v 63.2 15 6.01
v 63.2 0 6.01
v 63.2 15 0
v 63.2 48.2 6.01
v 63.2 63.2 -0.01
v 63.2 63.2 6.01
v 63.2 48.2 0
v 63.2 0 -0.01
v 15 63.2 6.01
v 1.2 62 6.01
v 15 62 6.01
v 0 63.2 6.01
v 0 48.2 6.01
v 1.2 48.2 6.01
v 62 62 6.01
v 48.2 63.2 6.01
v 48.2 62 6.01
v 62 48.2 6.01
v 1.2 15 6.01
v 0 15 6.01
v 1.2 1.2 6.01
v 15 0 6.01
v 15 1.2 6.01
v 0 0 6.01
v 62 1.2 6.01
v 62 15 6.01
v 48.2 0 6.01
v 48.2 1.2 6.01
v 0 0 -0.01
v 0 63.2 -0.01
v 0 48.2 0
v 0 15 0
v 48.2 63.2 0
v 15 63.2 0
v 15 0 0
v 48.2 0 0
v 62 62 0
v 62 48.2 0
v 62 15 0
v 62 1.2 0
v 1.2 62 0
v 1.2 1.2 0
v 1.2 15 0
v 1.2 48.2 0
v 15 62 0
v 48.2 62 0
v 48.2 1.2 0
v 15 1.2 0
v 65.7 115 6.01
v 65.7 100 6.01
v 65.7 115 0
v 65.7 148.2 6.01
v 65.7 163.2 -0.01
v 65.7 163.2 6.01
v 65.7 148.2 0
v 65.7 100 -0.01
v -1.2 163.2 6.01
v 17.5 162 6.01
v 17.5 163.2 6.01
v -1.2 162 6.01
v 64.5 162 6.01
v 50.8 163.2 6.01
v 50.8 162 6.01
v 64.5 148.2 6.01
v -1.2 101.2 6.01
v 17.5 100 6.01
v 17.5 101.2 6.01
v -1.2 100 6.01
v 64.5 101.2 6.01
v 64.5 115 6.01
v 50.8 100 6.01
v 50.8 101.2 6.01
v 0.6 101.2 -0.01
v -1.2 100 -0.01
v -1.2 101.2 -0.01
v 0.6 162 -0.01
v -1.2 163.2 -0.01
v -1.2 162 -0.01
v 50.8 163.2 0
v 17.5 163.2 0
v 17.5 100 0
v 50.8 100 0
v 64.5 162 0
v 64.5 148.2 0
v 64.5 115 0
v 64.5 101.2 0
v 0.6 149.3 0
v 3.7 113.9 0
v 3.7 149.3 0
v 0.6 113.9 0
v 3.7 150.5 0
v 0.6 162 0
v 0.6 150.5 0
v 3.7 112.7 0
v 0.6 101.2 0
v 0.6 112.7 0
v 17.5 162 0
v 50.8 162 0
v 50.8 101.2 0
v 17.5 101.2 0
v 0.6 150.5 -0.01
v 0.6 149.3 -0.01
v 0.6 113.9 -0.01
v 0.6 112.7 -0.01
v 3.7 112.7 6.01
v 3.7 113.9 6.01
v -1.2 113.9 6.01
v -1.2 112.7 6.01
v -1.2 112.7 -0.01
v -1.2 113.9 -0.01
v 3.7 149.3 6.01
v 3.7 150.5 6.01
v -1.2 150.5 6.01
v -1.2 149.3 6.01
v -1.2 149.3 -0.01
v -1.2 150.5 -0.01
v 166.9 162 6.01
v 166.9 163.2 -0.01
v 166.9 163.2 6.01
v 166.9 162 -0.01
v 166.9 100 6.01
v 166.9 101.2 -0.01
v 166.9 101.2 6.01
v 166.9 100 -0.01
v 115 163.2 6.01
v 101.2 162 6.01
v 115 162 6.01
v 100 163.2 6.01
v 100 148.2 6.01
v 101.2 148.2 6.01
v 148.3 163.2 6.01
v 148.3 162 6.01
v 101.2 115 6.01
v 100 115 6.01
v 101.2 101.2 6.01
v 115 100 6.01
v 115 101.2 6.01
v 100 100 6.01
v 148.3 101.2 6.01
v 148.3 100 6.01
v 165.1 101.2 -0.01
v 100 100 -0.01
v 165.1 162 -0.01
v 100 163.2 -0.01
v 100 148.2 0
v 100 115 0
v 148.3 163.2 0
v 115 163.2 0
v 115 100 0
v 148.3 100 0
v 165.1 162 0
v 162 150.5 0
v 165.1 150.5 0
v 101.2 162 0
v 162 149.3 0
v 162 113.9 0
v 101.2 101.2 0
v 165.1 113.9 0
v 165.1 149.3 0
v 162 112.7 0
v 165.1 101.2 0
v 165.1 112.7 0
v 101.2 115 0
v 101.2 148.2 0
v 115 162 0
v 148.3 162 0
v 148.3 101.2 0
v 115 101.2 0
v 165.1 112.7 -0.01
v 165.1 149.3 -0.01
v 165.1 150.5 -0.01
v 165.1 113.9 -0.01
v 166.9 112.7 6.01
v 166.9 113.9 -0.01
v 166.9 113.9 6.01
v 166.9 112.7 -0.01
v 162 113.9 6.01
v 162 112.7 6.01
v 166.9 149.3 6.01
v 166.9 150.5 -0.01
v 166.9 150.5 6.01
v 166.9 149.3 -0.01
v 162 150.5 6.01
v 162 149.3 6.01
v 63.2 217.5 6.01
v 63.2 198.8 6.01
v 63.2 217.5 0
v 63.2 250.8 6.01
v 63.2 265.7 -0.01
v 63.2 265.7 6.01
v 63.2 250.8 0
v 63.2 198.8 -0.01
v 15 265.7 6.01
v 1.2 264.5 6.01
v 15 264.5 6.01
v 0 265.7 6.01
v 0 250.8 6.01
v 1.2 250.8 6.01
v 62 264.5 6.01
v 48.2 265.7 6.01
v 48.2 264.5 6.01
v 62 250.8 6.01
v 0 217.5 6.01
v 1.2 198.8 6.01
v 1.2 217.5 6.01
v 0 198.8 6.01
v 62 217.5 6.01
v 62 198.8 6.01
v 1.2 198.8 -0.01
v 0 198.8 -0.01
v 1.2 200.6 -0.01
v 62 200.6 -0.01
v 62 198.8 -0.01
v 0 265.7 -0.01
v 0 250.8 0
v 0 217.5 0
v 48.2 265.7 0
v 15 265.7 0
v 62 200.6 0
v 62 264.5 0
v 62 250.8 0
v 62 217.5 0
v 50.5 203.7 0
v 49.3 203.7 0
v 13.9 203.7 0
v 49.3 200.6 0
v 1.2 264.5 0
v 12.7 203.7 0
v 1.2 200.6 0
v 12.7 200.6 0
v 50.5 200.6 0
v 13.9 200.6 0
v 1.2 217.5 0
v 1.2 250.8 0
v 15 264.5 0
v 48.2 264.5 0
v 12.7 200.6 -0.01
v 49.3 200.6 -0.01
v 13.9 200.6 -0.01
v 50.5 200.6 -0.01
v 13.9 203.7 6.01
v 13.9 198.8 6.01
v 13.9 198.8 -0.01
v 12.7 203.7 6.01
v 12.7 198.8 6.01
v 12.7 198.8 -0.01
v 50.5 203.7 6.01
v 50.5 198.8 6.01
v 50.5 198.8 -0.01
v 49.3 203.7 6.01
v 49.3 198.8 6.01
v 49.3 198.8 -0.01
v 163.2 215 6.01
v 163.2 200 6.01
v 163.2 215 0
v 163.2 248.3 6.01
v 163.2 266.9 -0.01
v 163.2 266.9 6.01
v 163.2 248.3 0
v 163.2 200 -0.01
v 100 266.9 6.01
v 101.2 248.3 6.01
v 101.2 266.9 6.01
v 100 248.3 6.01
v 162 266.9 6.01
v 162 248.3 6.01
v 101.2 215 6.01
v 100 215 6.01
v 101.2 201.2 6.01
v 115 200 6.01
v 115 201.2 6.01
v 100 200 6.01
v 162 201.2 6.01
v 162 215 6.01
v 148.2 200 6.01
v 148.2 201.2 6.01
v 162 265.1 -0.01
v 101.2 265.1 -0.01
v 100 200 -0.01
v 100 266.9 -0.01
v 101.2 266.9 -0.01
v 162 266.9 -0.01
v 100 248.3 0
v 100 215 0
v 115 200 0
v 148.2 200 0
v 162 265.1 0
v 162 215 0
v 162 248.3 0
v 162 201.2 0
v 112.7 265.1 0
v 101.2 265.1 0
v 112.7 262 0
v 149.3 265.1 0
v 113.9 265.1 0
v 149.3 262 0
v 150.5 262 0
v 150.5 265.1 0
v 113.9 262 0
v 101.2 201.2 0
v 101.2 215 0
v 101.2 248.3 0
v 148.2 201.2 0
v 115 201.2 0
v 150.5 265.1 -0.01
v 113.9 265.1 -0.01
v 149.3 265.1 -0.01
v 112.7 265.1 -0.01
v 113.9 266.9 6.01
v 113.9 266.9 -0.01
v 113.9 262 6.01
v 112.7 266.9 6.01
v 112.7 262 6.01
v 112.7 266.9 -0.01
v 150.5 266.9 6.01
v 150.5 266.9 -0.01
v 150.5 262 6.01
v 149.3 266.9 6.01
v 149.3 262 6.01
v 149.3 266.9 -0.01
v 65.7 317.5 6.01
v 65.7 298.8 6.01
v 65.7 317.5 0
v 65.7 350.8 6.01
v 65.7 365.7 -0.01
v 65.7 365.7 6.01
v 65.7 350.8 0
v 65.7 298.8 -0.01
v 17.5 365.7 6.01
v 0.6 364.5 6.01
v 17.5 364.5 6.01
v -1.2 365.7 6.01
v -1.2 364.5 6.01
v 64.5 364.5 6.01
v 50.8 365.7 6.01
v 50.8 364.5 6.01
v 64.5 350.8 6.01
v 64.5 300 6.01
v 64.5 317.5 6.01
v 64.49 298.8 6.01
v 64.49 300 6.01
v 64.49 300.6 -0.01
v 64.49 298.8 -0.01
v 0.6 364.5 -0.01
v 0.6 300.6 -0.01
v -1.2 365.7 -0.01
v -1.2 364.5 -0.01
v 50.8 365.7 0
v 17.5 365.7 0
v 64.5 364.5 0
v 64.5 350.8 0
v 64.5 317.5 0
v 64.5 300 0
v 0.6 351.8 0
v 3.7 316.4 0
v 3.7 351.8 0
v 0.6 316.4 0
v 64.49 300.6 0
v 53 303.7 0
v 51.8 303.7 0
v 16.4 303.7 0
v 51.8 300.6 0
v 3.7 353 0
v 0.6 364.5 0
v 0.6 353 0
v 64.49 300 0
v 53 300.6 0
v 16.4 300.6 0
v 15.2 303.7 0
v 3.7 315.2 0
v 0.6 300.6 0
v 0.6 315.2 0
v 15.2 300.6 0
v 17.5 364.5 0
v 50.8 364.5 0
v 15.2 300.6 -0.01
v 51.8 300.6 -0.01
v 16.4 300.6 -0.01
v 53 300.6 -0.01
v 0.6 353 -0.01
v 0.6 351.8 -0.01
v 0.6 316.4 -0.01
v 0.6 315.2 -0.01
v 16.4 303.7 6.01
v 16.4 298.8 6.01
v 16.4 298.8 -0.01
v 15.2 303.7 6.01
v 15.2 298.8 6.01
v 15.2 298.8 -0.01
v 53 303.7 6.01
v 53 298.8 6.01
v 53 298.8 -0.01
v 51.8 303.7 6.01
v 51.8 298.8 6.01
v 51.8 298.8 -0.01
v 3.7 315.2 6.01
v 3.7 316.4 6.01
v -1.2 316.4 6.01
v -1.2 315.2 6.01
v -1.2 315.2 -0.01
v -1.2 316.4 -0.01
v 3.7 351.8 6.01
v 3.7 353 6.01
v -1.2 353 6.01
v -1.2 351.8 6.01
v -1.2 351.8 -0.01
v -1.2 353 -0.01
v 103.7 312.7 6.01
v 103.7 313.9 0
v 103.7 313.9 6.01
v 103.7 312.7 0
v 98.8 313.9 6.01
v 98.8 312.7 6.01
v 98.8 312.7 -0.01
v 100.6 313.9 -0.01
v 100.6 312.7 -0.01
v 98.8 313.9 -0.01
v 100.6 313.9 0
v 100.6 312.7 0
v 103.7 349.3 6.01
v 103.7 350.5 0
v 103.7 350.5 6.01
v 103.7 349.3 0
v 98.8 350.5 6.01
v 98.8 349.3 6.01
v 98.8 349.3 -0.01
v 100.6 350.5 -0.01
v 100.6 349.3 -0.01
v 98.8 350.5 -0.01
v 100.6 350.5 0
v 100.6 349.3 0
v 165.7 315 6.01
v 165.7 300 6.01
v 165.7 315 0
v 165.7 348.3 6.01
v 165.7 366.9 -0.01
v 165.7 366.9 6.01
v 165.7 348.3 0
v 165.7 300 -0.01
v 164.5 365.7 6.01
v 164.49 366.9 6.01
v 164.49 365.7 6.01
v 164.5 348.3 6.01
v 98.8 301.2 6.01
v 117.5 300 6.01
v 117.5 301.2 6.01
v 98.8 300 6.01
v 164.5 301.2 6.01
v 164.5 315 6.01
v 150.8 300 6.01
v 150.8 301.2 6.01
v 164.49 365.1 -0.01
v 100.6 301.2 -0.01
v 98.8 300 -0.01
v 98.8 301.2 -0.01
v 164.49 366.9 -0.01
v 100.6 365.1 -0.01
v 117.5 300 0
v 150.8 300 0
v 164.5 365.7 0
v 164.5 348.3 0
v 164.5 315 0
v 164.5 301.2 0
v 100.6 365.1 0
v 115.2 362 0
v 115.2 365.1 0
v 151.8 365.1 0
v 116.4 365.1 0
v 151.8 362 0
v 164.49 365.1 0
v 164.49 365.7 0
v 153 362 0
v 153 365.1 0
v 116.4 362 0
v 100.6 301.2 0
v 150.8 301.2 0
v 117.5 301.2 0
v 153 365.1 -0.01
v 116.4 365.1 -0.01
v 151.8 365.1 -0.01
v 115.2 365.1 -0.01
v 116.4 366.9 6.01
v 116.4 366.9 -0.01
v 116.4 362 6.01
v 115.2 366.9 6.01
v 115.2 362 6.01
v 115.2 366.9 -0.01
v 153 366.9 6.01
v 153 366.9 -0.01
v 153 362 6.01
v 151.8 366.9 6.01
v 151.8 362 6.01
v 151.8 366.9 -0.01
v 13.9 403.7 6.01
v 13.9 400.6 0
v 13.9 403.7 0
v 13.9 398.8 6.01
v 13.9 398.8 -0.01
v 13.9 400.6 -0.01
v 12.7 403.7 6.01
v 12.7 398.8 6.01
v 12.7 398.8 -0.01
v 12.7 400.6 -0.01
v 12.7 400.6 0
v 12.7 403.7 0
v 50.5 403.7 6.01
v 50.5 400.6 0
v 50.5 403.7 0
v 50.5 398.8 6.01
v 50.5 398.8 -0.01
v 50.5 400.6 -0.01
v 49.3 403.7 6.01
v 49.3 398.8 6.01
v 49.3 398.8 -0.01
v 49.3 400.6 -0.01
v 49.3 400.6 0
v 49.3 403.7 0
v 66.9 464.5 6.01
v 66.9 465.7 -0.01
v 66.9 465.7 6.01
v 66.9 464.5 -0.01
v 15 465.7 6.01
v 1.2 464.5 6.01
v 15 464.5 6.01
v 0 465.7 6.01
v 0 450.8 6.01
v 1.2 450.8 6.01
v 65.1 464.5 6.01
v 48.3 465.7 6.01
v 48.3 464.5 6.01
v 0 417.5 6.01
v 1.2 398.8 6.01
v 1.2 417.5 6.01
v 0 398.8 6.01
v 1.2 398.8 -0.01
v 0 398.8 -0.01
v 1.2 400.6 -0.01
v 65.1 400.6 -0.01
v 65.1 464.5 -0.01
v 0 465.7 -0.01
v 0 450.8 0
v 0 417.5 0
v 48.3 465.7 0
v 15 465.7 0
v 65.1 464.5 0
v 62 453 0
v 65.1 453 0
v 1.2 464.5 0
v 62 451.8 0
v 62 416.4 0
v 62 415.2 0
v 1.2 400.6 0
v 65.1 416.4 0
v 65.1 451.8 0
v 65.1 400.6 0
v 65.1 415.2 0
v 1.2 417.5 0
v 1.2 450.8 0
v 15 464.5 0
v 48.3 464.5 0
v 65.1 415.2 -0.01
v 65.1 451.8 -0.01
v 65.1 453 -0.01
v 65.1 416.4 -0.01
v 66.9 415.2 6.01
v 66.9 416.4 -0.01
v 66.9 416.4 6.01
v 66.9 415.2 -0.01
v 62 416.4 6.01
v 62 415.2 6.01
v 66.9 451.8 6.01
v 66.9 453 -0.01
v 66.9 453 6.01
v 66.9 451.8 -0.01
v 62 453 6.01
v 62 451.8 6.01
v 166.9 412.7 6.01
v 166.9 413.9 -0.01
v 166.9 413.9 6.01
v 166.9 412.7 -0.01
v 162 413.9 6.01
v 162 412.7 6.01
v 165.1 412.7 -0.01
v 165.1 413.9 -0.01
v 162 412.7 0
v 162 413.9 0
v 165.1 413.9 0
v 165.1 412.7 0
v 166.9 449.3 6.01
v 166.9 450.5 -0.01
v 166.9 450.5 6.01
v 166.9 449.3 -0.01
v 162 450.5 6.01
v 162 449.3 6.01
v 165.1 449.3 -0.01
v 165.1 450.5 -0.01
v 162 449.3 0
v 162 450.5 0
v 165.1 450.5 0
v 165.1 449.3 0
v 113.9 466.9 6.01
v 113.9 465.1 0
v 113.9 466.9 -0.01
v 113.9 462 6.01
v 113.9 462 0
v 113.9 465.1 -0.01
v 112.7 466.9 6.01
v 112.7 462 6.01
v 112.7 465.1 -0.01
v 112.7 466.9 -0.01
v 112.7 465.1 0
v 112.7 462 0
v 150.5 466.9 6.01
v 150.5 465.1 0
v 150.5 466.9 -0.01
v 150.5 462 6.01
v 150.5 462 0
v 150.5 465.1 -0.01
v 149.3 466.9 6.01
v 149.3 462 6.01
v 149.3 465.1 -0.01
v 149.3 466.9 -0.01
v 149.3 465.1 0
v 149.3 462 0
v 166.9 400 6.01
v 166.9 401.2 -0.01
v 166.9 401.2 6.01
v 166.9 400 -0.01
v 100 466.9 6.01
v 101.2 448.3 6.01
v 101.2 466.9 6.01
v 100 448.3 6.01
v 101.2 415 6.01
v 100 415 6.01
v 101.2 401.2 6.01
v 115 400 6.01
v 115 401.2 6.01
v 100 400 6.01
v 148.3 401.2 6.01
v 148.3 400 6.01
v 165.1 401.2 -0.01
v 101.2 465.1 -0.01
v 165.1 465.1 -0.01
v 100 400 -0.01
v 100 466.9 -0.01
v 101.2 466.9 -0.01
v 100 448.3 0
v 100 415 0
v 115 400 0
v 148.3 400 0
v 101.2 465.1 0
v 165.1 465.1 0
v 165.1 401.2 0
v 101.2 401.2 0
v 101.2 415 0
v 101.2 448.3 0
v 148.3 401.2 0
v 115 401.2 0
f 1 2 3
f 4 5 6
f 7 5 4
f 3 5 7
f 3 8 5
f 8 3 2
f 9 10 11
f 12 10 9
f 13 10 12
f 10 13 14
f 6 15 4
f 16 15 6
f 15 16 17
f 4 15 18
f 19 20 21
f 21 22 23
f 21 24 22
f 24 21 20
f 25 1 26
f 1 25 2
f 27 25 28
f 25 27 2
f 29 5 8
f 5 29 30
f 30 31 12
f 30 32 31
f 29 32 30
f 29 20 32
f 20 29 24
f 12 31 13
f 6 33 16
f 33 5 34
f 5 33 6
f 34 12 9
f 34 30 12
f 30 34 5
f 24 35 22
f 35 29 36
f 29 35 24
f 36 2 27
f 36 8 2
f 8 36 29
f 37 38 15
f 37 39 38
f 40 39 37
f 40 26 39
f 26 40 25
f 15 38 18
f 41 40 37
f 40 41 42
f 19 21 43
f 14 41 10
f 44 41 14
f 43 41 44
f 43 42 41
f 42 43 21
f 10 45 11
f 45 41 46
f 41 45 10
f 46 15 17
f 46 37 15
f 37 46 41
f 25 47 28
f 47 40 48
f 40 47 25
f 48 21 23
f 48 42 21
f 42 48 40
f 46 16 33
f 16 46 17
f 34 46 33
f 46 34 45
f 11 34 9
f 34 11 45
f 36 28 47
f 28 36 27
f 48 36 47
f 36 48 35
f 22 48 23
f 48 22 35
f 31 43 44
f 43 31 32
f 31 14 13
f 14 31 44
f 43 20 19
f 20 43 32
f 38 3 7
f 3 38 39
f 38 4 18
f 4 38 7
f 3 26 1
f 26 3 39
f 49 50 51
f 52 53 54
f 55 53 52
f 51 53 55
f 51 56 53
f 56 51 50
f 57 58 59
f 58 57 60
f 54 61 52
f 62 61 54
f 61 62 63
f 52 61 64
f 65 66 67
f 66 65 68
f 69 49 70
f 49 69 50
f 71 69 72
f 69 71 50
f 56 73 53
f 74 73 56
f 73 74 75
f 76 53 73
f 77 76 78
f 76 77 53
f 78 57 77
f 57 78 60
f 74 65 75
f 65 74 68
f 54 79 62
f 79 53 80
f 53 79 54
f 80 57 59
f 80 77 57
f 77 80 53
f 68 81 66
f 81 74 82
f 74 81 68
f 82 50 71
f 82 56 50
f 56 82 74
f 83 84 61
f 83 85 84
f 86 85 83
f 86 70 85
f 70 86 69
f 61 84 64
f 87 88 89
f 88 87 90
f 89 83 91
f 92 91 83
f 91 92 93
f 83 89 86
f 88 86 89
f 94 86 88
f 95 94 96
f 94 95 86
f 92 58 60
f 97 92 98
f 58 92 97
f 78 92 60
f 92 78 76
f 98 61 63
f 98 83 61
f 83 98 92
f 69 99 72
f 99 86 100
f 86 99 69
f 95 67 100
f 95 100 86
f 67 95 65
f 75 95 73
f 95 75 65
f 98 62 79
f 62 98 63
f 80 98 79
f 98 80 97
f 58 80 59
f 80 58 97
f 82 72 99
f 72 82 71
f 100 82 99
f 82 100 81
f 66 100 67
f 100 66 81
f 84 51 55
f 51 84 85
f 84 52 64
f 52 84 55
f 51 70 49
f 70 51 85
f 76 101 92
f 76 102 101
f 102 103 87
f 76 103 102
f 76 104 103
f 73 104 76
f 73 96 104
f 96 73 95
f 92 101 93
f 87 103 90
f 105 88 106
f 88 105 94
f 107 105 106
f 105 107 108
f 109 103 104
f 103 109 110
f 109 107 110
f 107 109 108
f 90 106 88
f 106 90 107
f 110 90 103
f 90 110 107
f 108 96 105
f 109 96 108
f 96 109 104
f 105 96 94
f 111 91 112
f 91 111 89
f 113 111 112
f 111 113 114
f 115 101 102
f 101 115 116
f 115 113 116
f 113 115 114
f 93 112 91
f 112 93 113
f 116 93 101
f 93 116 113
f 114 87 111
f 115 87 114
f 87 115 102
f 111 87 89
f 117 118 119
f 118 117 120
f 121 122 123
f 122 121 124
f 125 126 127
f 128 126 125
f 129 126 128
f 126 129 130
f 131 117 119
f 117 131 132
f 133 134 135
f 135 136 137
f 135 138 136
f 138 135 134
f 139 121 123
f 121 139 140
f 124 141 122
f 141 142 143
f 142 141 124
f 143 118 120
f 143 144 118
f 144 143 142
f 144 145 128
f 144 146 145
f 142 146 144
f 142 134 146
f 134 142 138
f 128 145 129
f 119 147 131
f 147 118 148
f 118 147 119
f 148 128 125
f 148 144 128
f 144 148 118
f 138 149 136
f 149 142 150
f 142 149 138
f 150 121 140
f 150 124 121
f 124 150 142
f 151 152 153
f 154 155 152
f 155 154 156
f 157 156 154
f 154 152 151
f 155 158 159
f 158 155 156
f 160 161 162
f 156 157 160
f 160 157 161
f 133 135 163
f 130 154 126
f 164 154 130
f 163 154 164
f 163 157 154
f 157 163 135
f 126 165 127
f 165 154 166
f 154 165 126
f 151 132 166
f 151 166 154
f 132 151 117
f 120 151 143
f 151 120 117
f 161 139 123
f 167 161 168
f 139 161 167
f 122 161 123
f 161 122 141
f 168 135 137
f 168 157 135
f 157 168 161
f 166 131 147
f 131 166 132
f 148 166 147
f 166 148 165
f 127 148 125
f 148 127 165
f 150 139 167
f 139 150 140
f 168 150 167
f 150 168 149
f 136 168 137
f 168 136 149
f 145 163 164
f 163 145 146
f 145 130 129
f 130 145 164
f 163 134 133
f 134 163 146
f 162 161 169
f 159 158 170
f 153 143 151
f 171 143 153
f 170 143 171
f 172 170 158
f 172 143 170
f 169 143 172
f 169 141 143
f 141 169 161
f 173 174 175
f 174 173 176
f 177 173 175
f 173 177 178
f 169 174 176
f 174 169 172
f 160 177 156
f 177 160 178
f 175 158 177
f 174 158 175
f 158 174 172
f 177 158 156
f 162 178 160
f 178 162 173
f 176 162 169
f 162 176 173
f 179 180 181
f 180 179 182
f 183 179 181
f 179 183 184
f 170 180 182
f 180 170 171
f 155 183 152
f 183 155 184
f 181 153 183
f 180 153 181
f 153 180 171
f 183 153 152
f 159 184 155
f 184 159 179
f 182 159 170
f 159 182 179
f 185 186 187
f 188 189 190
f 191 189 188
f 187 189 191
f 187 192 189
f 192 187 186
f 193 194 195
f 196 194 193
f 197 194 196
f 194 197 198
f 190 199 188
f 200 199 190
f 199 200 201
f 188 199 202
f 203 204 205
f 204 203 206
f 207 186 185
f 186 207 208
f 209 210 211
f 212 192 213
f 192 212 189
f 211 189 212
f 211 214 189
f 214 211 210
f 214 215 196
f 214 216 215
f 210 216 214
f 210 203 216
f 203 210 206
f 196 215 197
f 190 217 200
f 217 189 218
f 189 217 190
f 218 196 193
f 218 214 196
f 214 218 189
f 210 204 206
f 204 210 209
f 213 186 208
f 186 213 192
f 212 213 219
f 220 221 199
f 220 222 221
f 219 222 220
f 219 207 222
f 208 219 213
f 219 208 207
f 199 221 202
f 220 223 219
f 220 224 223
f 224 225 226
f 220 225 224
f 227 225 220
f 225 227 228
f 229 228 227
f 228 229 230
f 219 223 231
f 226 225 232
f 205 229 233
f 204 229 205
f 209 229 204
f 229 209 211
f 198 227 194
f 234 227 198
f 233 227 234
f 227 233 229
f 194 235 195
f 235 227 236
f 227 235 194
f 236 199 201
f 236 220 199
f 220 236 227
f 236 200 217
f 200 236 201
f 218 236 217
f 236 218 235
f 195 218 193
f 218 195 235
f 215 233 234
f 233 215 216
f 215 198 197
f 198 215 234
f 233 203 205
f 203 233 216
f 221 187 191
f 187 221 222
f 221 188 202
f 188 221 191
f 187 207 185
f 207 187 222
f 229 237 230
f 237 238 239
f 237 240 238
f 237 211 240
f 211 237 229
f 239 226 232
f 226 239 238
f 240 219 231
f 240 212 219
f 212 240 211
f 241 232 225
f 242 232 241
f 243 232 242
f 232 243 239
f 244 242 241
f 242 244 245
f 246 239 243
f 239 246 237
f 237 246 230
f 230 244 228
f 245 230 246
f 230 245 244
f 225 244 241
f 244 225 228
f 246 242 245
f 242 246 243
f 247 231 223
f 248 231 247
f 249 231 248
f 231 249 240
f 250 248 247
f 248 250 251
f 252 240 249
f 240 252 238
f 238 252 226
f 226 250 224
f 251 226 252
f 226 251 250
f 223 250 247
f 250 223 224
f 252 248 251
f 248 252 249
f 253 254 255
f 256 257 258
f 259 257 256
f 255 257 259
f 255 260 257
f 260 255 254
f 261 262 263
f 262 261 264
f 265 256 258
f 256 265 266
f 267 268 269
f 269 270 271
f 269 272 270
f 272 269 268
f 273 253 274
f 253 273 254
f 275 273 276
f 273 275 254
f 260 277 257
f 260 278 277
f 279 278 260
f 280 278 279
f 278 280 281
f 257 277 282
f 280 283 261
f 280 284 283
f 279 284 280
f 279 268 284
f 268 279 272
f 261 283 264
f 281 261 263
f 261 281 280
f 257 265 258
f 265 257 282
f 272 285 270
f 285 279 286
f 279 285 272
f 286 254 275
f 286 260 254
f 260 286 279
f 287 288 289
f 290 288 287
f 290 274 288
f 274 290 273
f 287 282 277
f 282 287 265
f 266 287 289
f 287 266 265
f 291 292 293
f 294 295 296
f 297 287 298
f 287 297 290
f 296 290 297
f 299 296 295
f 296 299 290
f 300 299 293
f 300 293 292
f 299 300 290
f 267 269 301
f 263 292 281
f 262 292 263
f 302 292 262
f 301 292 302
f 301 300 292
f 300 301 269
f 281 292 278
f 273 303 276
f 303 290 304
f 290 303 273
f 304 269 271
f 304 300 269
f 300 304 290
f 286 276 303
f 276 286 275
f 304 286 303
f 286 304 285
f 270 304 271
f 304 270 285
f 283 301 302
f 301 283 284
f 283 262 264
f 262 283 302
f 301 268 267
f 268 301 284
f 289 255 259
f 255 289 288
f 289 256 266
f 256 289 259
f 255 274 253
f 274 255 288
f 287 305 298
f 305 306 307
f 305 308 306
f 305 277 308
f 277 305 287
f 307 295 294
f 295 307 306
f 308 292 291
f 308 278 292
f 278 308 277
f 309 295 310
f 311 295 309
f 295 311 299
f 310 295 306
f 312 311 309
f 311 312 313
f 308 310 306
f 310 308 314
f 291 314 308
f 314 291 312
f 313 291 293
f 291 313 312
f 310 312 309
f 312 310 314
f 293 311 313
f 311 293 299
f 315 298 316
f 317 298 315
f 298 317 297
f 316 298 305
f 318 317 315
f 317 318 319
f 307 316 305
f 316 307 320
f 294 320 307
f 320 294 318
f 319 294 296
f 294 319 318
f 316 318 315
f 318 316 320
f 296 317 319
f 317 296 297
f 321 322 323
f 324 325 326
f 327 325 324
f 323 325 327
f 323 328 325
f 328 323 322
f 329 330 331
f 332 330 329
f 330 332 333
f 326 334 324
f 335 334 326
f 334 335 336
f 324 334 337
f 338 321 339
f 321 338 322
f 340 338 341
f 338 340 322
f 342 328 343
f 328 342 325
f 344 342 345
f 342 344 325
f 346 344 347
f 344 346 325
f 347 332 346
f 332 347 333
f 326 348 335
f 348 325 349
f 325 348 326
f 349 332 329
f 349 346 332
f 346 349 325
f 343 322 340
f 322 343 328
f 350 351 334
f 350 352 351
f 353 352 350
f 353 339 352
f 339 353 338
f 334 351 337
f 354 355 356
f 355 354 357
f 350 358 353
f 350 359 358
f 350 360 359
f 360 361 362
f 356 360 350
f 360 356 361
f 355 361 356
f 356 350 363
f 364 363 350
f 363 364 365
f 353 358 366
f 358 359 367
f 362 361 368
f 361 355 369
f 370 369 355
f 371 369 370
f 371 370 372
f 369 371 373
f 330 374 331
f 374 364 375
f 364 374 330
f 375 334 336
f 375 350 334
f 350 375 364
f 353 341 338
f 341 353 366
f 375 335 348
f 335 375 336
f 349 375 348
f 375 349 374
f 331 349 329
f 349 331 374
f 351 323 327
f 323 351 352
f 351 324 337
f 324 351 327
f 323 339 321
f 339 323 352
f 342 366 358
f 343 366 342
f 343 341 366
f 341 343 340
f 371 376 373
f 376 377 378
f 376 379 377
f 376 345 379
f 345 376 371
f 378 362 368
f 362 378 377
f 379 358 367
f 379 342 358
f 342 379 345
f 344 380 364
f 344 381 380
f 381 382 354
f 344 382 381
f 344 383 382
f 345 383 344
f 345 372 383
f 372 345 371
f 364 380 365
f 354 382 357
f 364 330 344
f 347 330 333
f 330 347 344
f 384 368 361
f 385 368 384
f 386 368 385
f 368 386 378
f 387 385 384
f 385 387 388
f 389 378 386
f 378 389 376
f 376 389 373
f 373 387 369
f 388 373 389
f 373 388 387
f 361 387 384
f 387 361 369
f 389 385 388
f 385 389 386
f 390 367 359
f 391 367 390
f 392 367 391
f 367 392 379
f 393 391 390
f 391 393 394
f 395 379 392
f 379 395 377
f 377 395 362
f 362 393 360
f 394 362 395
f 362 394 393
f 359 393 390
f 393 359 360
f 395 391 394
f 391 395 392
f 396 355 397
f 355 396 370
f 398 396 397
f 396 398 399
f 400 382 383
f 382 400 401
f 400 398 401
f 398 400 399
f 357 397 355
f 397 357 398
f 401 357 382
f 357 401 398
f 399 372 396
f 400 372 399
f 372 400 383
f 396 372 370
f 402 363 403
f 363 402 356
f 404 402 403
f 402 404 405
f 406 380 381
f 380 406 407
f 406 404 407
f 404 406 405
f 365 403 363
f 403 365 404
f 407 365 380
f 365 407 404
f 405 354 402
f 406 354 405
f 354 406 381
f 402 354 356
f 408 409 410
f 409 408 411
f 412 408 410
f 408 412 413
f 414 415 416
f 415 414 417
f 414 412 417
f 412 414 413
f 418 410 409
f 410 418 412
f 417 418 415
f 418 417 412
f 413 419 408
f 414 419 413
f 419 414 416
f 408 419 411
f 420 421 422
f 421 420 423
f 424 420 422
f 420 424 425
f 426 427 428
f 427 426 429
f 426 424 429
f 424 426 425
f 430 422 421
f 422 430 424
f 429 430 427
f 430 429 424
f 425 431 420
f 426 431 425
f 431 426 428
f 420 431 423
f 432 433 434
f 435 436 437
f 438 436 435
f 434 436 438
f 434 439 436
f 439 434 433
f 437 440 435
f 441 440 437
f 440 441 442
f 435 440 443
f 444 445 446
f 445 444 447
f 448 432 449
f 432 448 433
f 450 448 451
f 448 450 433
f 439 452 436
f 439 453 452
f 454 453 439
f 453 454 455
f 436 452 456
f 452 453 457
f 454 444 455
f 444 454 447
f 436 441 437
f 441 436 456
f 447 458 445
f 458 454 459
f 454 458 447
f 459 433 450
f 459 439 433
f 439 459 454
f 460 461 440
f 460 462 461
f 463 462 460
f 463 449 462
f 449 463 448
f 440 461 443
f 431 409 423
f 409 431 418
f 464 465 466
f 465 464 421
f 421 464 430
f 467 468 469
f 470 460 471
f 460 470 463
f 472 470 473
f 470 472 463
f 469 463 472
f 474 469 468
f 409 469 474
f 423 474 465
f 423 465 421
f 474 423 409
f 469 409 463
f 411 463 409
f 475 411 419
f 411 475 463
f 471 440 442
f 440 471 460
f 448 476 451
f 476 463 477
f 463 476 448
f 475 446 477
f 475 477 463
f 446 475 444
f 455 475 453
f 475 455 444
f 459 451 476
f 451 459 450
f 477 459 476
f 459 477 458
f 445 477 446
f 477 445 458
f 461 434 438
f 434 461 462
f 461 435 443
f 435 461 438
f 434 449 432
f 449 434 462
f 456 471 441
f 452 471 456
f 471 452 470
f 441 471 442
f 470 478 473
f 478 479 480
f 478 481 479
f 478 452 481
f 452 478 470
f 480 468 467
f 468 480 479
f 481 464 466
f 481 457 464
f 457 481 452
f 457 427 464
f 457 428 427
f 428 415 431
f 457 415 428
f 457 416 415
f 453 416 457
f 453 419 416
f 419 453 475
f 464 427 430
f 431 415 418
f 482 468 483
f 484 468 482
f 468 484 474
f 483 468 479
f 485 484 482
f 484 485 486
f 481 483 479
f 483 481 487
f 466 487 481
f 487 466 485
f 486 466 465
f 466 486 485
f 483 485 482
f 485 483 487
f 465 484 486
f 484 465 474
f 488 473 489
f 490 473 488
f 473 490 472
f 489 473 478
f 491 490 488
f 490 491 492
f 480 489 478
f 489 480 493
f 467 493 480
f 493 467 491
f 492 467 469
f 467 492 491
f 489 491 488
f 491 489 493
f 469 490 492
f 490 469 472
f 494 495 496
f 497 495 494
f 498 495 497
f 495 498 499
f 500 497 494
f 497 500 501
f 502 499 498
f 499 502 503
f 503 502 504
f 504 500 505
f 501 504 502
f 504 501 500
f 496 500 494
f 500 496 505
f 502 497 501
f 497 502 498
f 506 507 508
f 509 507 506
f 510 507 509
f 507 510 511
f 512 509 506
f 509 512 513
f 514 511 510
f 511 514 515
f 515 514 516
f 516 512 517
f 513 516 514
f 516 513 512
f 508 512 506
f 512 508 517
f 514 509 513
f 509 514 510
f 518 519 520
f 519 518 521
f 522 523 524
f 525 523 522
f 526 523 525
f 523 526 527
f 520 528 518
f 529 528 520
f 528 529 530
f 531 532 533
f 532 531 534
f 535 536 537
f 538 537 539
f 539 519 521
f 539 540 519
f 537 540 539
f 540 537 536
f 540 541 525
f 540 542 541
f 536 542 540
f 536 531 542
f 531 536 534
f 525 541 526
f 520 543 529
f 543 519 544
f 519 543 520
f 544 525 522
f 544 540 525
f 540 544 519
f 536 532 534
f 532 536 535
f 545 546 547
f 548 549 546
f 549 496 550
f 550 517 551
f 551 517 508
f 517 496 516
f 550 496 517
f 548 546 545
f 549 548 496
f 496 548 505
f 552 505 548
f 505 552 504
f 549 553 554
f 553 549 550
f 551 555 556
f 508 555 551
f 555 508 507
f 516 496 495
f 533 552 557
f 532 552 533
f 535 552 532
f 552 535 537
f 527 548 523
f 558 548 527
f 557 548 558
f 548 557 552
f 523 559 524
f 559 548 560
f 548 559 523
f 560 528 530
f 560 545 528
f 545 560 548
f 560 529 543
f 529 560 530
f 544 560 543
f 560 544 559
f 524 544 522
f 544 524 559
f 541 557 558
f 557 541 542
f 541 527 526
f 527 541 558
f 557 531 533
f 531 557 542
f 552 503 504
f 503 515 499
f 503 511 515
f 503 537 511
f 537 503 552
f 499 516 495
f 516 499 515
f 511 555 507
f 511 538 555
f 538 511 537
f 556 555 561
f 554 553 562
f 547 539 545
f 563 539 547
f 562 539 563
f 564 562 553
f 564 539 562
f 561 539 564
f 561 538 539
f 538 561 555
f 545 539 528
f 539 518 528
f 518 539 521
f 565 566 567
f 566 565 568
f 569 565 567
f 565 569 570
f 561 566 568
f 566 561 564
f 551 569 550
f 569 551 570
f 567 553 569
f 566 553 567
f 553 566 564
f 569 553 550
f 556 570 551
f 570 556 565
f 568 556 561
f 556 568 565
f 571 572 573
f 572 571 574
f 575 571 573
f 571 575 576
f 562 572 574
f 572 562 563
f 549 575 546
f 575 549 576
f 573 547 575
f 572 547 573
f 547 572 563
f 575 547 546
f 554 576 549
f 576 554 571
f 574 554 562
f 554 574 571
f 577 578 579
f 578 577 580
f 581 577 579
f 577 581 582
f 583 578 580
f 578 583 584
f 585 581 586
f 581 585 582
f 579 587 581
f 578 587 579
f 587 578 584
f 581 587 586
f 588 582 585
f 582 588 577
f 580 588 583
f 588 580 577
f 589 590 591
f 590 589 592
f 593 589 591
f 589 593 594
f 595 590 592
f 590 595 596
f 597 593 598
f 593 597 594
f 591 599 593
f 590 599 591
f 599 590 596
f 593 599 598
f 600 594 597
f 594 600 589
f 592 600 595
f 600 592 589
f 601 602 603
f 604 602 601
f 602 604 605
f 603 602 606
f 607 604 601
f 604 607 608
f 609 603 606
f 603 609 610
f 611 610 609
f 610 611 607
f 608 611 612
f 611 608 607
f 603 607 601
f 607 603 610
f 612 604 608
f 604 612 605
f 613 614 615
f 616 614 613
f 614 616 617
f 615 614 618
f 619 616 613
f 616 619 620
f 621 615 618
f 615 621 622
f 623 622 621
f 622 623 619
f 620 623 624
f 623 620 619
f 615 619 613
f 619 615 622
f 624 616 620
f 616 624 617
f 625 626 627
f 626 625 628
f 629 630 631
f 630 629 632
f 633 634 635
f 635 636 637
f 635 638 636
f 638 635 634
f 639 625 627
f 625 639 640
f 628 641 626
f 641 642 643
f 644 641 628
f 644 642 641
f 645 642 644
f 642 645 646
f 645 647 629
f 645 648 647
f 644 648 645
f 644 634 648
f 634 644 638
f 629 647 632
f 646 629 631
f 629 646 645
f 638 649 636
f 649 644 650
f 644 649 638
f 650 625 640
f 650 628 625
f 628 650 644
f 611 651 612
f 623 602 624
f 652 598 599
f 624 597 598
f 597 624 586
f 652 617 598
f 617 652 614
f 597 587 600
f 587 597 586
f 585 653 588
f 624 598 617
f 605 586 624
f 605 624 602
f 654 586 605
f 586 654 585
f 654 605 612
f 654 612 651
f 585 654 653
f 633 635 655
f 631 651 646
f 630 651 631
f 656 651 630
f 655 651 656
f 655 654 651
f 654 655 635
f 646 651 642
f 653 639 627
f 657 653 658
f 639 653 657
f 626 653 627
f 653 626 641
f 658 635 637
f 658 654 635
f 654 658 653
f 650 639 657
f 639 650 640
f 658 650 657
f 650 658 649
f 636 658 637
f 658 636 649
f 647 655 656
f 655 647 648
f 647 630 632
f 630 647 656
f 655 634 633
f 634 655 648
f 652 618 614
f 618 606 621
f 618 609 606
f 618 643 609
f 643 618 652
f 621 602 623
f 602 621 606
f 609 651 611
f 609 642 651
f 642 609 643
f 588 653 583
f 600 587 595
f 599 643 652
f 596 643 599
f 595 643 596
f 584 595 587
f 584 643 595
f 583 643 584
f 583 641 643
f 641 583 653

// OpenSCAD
// file: ../../Base/Boxes.scad
// Fischertechnik Box Foundation
// Pre-designed Boxes

use <Constants.scad>

include <PlacementOptions.scad>

box190Width = 190;
box190Depth = 130;
box130Width = 130;
box130Depth = 95;

// Values are from an original ec3 box
topBottomDifference = 1.5;
outerHeight = 40;
innerHeight = 38.2;
baseThickness = outerHeight - innerHeight;
stackExcess = 5.7;
radius = 3.5;
wallThickness = 1.5;
tolerance = 0.2;
stackOffset = innerHeight - stackExcess;

boxUsageHeight = stackOffset;
boxWallThickness = wallThickness;
boxBaseThickness = baseThickness;
boxWebWidth = 3.0;

// getBoxWallThickness()
// Gets the wall thickness of a Fischertechnik Box
function getBoxWallThickness() = boxWallThickness;

// getBoxUsageHeight()
// Gets the usable height of a Fischertechnik box
function getBoxUsageHeight() = boxUsageHeight;

// getBoxInnerHeight()
// Gets the inner height of a Fischertechnik box, including the stack excess
function getBoxInnerHeight() = innerHeight;

// getBoxBaseThickness()
// Gets the thickness of the Fischertechnik box base.
function getBoxBaseThickness() = boxBaseThickness;

// getBoxWebWidth()
// Gets the width of a box web
function getBoxWebWidth() = boxWebWidth;

// getBox190Space()
// Gets the usable inner space of a Box 190 as an x/y-list
function getBox190Space() = [
    box190Width - 2*getBoxWallThickness() - topBottomDifference, 
    box190Depth - 2*getBoxWallThickness() - topBottomDifference ];

// BoxBase(width, depth)
// Creates an empty stackable Fischertechnik compatible box
// width = Outer width of the box (190, 130, ...)
// depth = Outer depth of the box (130, 95, ...)

module BoxBase(width, depth, height=outerHeight) {    
    thinPlate = 0.01;

    innerHeight = height - baseThickness;    
    
    module BodyPlate(width, depth) {
        translate([radius, radius])
        hull() {
            w = width-2*radius;
            d = depth-2*radius;
            cube([w, d, thinPlate]);
            cylinder(thinPlate, r=radius, $fn=getFragments());
            translate([w, 0])
                cylinder(thinPlate, r=radius, $fn=getFragments());
            translate([w, d])
                cylinder(thinPlate, r=radius, $fn=getFragments());
            translate([0, d])
                cylinder(thinPlate, r=radius, $fn=getFragments());
        }
    }
    
    module Body(tolerance=tolerance) {
        hull() {
            // Bottom with tolerance to fit into the original boxes when stacked
            translate([-wallThickness+tolerance, -wallThickness+tolerance, -baseThickness])
                BodyPlate(width-topBottomDifference-2*tolerance, depth-topBottomDifference-2*tolerance);
            
            // Top
            translate([-wallThickness-topBottomDifference/2, -wallThickness-topBottomDifference/2, innerHeight-thinPlate])
                BodyPlate(width, depth);
         }
    }

    module Cutoff() {
        hull() {
            coWidth = width - 2*wallThickness;
            coDepth = depth - 2*wallThickness;
            
            // Bottom
            BodyPlate(coWidth-topBottomDifference, coDepth-topBottomDifference);

            // Top
            translate([-topBottomDifference/2, -topBottomDifference/2, innerHeight+thinPlate]) 
                BodyPlate(coWidth, coDepth);
        }
    }
    
    difference() {        
        Body();
        Cutoff();
        stackOffset = innerHeight - stackExcess;
        translate([0, 0, stackOffset + baseThickness])
            Body(tolerance=0);
    }
}

// Creates the Fischertechnik empty box 130x190 mm and places it at position 0,0
// 190x130 are the outer sizes, the inner space is slightly smaller. Use getBox190Space() to get the inner sizes.
// The box is positioned that the usable inner space is at the 0,0,0 position. The

module Box190() {
    BoxBase(box190Width, box190Depth);
}

// Gets the usable inner space of a Box 130 as an x/y-list
function getBox130Space() = [
    box130Width - 2*getBoxWallThickness() - topBottomDifference, 
    box130Depth - 2*getBoxWallThickness() - topBottomDifference ];

// Creates the Fischertechnik empty box 95x130 mm and places it at position 0,0
// 190x130 are the outer sizes, the inner space is slightly smaller. Use getBox190Space() to get the inner sizes.
// The box is positioned that the usable inner space is at the 0,0,0 position. The

module Box130() {
    BoxBase(box130Width, box130Depth);
}

// Creates a web at the specified box walls
// corner 0 = LowerLeft, 1 = UpperLeft, 2 = UpperRight, 3 = LowerRight
// side 0 = LeftOfCorner, 1 = RightOfCorner
// distance = Distance in mm from the corner
// boxSpace = inner width and depth of the box (default: Box 190)
// webWidth = length of the web (default is 3 mms)
// webThickness = thickness of the web (default is 1 mm)

module BoxWeb(corner, side, distance, boxSpace=getBox190Space(), webWidth=getBoxWebWidth(), webThickness=1.0) {
    sink = getBoxWallThickness()/2;

    width = (corner % 2 == 0) ? 
            (side == LeftOfCorner ? webWidth : webThickness) :
            (side == LeftOfCorner ? webThickness : webWidth);

    depth = (corner % 2 == 0) ? 
            (side == RightOfCorner ? webWidth : webThickness) :
            (side == RightOfCorner ? webThickness : webWidth);
    
    xDiff = corner == LowerLeft ? 
                (side == LeftOfCorner ? -sink : distance) :
            (corner == UpperLeft ?                
                (side == LeftOfCorner ? distance : -sink) :
            (corner == UpperRight ?
                (side == LeftOfCorner ? boxSpace.x-webWidth+sink : boxSpace.x-distance-webThickness) :
                (side == LeftOfCorner ? boxSpace.x-distance-webThickness: boxSpace.x-webWidth+sink)));

    yDiff = corner == LowerLeft ? 
                (side == RightOfCorner ? -sink : distance) :
            (corner == UpperLeft ?
                (side == RightOfCorner ? boxSpace.y-distance : boxSpace.y-webWidth+sink) :
            (corner == UpperRight ?
                (side == RightOfCorner ? boxSpace.y-webWidth+sink : boxSpace.y-distance) :
                (side == RightOfCorner ? distance : -sink)));
    
    translate([xDiff, yDiff, -getExcess()])
        cube([width, depth, boxUsageHeight + 2*getExcess()]);
}
// file: ../../Base/Rotation.scad
// Fischertechnik Box Foundation
// Geometry Helpers Rotation

include <PlacementOptions.scad>

// getRotatedSpace(space, rotation=NoRotation)
// Rotates the space dependent on the specified rotation

function getRotatedSpace(space, rotation=NoRotation) = [
    (rotation == Rotate90 || rotation == Rotate270) ? space.y : space.x,
    (rotation == Rotate90 || rotation == Rotate270) ? space.x : space.y
];

// Rotates the given space around the fixed left lower corner
// space = the space the children needs as width/depth list [width,depth]
// rotation = 0 Rotate0 degrees, 1 Rotate90 degrees, 2 Rotate180 degrees, 3 Rotate270 degrees (equivalent to -90)

module RotateFix(space, rotation=NoRotation) {
    dy = (rotation == Rotate0 || rotation == Rotate270) ? 0 :
        (rotation == Rotate90) ? space.x :
        space.y;
    dx = (rotation < Rotate180) ? 0 :
        (rotation == Rotate180) ? space.x :
        space.y;
    
    translate([dx, dy, 0])
        rotate([0, 0, rotations[rotation]])
            children();
}
// file: ../../Base/Alignment.scad
// Fischertechnik Box Foundation
// Geometry Helpers Alignment

include <PlacementOptions.scad>

// getAlignedX(elementWidth, spaceWidth, align=AlignRight, offset=0)
// Gets the aligned X offset of an element with the given
// width in the given space.
// elementWidth = The width of the element to positon
// spaceWidth = The space where the element should be aligned
// align = 0 AlignLeft, 1 AlignCenter, 2 AlignRight
// offset = an optional offset from the aligned position. When
// aligned left or centered, then positive values are in X direction.
// When aligned right then positive values are in negative X direction.

function getAlignedX(elementWidth, spaceWidth, align=AlignRight, offset=0) =
    (align == AlignLeft) ?
        offset :
        ((align == AlignCenter) ?
        (spaceWidth - elementWidth)/2 + offset :
        spaceWidth - offset - elementWidth);

// getAlignedY(elementDepth, spaceDepth, align=AlignTop, offset=0)
// Gets the aligned Y offset of an element with the given
// depth in the given space.
// elementDepth = The depth of the element to positon
// spaceDepth = The space where the element should be aligned
// align = 0 AlignBottom, 1 AlignCenter, 2 AlignTop
// offset = an optional offset from the aligned position. When
// aligned bottom or centered, then positive values are in Y direction.
// When aligned top then positive values are in negative Y direction.

function getAlignedY(elementDepth, spaceDepth, align=AlignTop, offset=0) =
    (align == AlignBottom) ?
        offset :
        ((align == AlignCenter) ?
        (spaceDepth - elementDepth)/2 + offset :
        spaceDepth - offset - elementDepth);
// file: ../../Base/Constants.scad
// Fischertechnik Box Foundation
// Constants

// Constant values necessary for multiple elements

// Base constants
dividerThickness = 1.2;
excess = 0.01;
fragments = 90;
tolerance = 0.8;

// Gets the thickness of a divider 
function getDividerThickness() = dividerThickness;

// Gets the excess that is used to merge walls into each other
function getExcess() = excess;

// Gets amount of fragments of a cylinder
function getFragments() = fragments;

// Gets the inner tolerance of a frame to each side
function getTolerance() = tolerance;


// Fischertechnik specific constants
axisDiameter = 4;
axisBottomDiameter = axisDiameter + 1;
standardEdgeDistance = 2.5;
standardWebDistance = 11.5;
standardCornerLength = 15;
tubeWallFactor = 0.8;
smallPartsFrameHeight = 20;

// Gets axis diameter
function getAxisDiameter() = axisDiameter;

// Gets axis bottom diameter for thicker part at the bottom
function getAxisBottomDiameter() = axisBottomDiameter;

// gets the standard distance to the wall of the box for dockable frames with webs
function getStandardEdgeDistance() = standardEdgeDistance;

// gets the standard distance of each web to the corner of the dockable frame
function getStandardWebDistance() = standardWebDistance;

// gets the standard length of the corner walls of a dockable frame
function getStandardCornerLength() = standardCornerLength;

// gets the wall thickness of a tube.
function getTubeWallThickness() = tubeWallFactor * getDividerThickness();

// gets the frame height for docked small parts boxes.
function getSmallPartsFrameHeight() = smallPartsFrameHeight;
// file: ../../Base/PlacementOptions.scad
// Fischertechnik Box Foundation
// Placement Options

// Alignment
NoAlign = 0;
AlignLeft = 1;
AlignBottom = 2;
AlignCenter = 3;
AlignRight = 4;
AlignTop = 5;

// Element rotation degree steps
rotations = [0, -90, -180, -270];

// Rotation
NoRotation = 0;
Rotate0 = 0;
Rotate90 = 1;
Rotate180 = 2;
Rotate270 = 3;

// Docking (seen from above)
NoDock = -1;
DockLeft = 0;
DockTop = 1;
DockRight = 2;
DockCorner = 2;
DockBottom = 3;

// Web corners
LowerLeft = 0;
UpperLeft = 1;
UpperRight = 2;
LowerRight = 3;

// Web position relative to corner
LeftOfCorner = 0;
RightOfCorner = 1;
// file: ../../Elements/FrameBTSmartController.scad
// Fischertechnik Box Library
// Frame for BT Smart Controller
// 161944

use <../Base/Constants.scad>
use <../ModelBase/Simple.scad>
use <../ModelBase/Complex.scad>

include <../Base/PlacementOptions.scad>

width = 60;
depth = 60;
height = 6;

// getFrameBTSmartControllerSpace(alignX, alignY)
// alignX 0=NoAlign 1=AlignLeft 3=AlignCenter 4=AlignRight 
// alignY 0=AlignNo 2=AlignBottom 3=AlignCenter 5=AlignTop
// Gets the space the frame for BT Smart Controller needs as width and depth(.x and .y as a list). 

function getFrameBTSmartControllerSpace(alignX=NoAlign, alignY=NoAlign) = 
    getDockableEdgedFrameSpace([width, depth, height], alignX, alignY);

// FrameBTSmartController(alignX, alignY)
// Frame for TBT Smart Controller.
// alignX 0=NoAlign 1=AlignLeft 3=AlignCenter 4=AlignRight 
// alignY 0=AlignNo 2=AlignBottom 3=AlignCenter 5=AlignTop

module FrameBTSmartController(alignX=NoAlign, alignY=NoAlign) {
    DockableEdgedFrame([width, depth, height], alignX, alignY);
}

// Test
color("lightgray") {
    FrameBTSmartController();
}
// file: ../../Base/Placement.scad
// Fischertechnik Box Foundation
// Geometry Helpers Placement

use <Constants.scad>
use <Alignment.scad>
use <Rotation.scad>
use <Boxes.scad>

include <PlacementOptions.scad>

// Place(x=0, y=0, elementSpace=[0,0], alignX=AlignLeft, alignY=AlignBottom, rotation=Rotate0, boxSpace=getBox190Space())
// Places the child at the specified position
// y = Y-Position. This is a relative position when an X aligment is specified.
// x = X-Position. This is a relative position when an Y aligment is specified.
// elementSpace = space of the element to be placed [x,y]
// alignX = -1=NoAlign, 0 AlignLeft, 1 AlignCenter, 3 AlignRight (elementSpace and boxSpace required!)
// alignY = -1=NoAlign, 2 AlignBottom, 1 AlignCenter, 4 AlignTop (elementSpace and boxSpace required!)
// rotation = 0 Rotate0 0 degrees, 1 Rotate90 90 degrees, 
// 2 Rotate180 180 degrees, 3 Rotate270 270 degrees (equivalent to -90)
// boxSpace = Inner space of the box where the placement occurs [x,y] - default is Box 190x130 inner space

module Place(x=0, y=0, elementSpace=[0,0], 
  alignX=AlignLeft, alignY=AlignBottom, 
  rotation=NoRotation, boxSpace=getBox190Space()) {

    module Position(x, y, space, rotation=Rotate0) {
        translate([x, y, 0])
            RotateFix(space, rotation)
                children();
    }

    space = getRotatedSpace(elementSpace, rotation);
    alignedX = getAlignedX(space.x, boxSpace.x, alignX, x);
    alignedY = getAlignedY(space.y, boxSpace.y, alignY, y);
    Position(alignedX, alignedY, elementSpace, rotation)
        children();
}

// Center(space=getBox130Space(), elementSpace=[0,0])
// space = Space where the children is centered. For cylinder use centered=true and no elementSpace.
// elementSpace = space of the element to be centered [x,y]

module Center(space=getBox190Space(), elementSpace=[0,0]) {
    Place(elementSpace=elementSpace, boxSpace=space, alignX=AlignCenter, alignY=AlignCenter)
        children();
}

// CenterHorizontal(width=0, y=0, offset=0, space=getBox130Space())
// width = Width of the element to be placed.
// y = Y position of the element
// offset = Offset from the center position (negative will be left of the center)
// space = Space where the element is placed

module CenterHorizontal(width=0, y=0, offset=0, space=getBox190Space()) {
    Place(x=offset, y=y, elementSpace=[width, 0], boxSpace=space, alignX=AlignCenter)
        children(0);
}

// CenterVertical(depth=0, x=0, offset=0, space=getBox130Space())
// depth = Depth of the element to be placed.
// x = X position of the element
// offset = Offset from the center position (negative will be down of the center)
// space = Space where the element is placed

module CenterVertical(depth=0, x=0, offset=0, space=getBox190Space()) {
    Place(x=x, y=offset, elementSpace=[0, depth], boxSpace=space, alignY=AlignCenter)
        children(0);
}

// getIsVertical(align)
// True if the specified alignment needs a vertical orientation for a divider (AlignRight, AlignLeft)

function getIsVertical(align) = (align == AlignRight || align == AlignLeft);

// getIsHorizontal(align)
// True if the specified alignment needs a horizontal orientation for a divider (AlignTop, AlignBottom)

function getIsHorizontal(align) = (align == AlignTop || align == AlignBottom);
// main file
// Fischertechnik Box Foundation
// Elements
// Test FrameBTSmartController

use <../../Base/Placement.scad>
use <../../Elements/FrameBTSmartController.scad>

include <../../Base/PlacementOptions.scad>

FrameBTSmartController();

Place(0, 100)
    FrameBTSmartController(alignX=AlignLeft);

Place(100, 100)
    FrameBTSmartController(alignX=AlignRight);

Place(0, 200)
    FrameBTSmartController(alignY=AlignBottom);

Place(100, 200)
    FrameBTSmartController(alignY=AlignTop);

Place(0, 300)
    FrameBTSmartController(alignX=AlignLeft, alignY=AlignBottom);

Place(100, 300)
    FrameBTSmartController(alignX=AlignLeft, alignY=AlignTop);

Place(0, 400)
    FrameBTSmartController(alignX=AlignRight, alignY=AlignBottom);

Place(100, 400)
    FrameBTSmartController(alignX=AlignRight, alignY=AlignTop);
